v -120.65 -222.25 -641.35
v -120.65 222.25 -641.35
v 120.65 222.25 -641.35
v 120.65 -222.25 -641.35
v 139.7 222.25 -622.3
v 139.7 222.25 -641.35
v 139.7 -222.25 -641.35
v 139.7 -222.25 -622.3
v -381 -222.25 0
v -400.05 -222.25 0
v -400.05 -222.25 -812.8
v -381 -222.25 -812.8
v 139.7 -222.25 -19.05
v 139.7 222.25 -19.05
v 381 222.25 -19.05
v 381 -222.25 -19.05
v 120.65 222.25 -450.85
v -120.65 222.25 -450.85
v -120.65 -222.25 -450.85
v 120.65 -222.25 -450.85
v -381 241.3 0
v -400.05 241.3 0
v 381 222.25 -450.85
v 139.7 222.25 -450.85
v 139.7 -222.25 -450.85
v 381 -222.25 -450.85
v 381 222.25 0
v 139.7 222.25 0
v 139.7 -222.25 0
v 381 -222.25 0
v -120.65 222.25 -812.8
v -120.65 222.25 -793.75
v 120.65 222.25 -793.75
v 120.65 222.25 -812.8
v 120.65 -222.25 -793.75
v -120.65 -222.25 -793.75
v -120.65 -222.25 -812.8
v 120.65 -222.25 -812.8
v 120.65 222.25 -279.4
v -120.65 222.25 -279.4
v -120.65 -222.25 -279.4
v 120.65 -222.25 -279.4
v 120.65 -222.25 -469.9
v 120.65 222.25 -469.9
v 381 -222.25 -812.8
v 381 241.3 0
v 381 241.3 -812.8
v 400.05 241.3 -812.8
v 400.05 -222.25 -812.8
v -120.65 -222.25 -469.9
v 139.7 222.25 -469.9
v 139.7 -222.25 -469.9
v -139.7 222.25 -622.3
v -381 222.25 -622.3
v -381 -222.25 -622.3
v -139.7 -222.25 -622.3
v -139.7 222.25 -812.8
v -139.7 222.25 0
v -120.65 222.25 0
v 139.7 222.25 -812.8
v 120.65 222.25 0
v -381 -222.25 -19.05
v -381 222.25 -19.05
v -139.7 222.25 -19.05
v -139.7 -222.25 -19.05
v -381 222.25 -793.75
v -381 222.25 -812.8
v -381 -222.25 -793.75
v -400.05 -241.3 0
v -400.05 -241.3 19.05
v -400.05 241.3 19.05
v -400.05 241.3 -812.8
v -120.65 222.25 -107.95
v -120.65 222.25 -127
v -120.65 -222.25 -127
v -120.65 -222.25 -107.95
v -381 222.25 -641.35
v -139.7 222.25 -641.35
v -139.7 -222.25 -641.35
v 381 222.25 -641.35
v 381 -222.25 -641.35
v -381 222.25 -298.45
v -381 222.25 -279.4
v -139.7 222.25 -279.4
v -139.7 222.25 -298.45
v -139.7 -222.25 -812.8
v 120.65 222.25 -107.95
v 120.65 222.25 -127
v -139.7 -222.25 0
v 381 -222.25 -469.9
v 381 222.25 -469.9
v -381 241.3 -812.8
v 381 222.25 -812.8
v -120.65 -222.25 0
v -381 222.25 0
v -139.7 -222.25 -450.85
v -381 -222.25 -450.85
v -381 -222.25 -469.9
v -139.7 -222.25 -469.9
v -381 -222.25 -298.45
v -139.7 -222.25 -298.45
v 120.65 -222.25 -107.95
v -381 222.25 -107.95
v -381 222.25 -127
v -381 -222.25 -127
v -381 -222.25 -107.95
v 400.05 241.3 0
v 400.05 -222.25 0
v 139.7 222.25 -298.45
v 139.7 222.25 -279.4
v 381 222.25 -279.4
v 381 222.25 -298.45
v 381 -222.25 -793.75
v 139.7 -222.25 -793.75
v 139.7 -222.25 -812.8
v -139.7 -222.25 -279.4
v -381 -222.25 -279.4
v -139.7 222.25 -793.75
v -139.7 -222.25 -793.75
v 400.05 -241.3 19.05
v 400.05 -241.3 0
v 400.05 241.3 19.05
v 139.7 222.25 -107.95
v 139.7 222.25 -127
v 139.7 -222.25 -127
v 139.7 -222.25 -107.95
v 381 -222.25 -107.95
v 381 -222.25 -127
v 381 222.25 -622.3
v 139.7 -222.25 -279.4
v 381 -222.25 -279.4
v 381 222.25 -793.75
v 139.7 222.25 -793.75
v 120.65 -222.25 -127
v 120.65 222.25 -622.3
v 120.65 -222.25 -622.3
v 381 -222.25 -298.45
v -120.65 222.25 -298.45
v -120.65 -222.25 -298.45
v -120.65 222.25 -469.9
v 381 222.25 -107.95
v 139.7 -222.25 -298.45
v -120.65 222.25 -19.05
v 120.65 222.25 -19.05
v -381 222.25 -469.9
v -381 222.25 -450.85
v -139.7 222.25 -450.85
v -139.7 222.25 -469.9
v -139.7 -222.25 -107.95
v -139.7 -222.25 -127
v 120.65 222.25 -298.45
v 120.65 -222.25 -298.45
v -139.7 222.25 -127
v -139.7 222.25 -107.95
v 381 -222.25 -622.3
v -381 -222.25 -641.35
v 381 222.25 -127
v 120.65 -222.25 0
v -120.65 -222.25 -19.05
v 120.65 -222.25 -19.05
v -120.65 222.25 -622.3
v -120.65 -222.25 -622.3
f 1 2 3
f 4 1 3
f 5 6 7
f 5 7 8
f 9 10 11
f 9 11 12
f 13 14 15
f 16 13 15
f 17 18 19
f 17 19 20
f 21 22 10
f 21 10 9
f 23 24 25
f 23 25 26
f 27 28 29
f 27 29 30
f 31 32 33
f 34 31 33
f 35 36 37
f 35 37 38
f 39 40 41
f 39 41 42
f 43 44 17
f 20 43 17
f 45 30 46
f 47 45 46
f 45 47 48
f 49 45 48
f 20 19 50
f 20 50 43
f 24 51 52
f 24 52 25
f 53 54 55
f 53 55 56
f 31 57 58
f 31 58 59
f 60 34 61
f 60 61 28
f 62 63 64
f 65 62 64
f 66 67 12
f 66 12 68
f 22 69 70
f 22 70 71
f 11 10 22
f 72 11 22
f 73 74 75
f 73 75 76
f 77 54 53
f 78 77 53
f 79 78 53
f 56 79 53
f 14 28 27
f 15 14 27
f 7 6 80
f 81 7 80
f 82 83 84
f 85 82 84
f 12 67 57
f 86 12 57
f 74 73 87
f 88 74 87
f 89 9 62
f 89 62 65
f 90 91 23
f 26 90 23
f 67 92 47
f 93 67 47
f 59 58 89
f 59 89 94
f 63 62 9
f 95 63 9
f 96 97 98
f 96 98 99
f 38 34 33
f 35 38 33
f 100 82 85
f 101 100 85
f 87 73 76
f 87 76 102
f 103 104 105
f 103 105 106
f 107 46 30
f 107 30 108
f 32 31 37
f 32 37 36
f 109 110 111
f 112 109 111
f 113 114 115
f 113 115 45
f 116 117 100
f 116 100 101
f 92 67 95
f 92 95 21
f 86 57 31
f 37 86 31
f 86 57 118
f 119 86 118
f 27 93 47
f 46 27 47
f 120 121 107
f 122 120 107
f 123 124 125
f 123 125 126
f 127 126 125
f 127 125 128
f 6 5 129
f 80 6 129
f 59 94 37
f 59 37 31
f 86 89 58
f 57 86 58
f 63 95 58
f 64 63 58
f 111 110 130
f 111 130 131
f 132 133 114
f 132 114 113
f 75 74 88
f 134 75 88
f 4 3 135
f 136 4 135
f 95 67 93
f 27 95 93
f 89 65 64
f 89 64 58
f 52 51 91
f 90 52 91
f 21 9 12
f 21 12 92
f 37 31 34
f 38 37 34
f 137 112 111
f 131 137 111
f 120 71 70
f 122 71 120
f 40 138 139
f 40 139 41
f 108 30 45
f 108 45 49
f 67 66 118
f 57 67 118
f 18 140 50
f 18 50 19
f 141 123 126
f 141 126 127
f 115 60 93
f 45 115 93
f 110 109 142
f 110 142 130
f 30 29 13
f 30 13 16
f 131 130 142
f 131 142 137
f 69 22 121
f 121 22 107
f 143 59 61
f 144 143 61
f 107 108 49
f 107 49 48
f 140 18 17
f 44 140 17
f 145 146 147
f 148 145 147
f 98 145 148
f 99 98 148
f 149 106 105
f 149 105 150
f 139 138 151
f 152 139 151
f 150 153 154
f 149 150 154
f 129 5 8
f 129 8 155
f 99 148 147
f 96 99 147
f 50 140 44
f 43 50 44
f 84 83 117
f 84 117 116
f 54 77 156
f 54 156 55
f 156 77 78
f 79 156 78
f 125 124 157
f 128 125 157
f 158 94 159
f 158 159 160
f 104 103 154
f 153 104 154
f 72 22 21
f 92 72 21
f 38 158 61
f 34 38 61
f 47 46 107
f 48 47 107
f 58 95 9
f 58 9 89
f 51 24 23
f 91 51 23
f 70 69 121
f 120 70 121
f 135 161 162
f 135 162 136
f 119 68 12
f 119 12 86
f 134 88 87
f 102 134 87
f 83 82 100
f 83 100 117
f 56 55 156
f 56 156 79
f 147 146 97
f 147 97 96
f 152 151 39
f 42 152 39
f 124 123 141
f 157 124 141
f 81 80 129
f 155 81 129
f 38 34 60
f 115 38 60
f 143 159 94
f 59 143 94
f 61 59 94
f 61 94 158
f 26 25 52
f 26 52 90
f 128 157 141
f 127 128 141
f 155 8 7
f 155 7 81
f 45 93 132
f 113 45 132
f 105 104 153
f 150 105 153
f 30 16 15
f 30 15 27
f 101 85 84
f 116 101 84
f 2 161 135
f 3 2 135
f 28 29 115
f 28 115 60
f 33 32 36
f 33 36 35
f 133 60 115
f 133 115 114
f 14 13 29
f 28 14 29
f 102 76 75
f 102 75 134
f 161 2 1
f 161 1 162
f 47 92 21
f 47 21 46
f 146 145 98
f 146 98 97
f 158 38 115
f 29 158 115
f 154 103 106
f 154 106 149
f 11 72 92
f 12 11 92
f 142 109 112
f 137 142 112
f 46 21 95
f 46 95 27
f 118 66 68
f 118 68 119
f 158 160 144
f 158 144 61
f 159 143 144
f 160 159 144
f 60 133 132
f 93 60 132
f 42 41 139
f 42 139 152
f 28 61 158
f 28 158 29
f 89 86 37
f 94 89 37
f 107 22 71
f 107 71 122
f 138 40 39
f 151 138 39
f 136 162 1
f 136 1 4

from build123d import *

# Parameters (mm, degrees)
F1_W      = 800.1
F1_H      = 482.6
F2_DEPTH  = 19.05
F3_W      = 19.05
F3_H      = 463.55
F4_DEPTH  = 812.8
F5_W      = 762
F5_H      = 19.05
F6_DEPTH  = 812.8
F7_W      = 19.05
F7_H      = 444.5
F8_DEPTH  = 812.8
F9_W      = 241.3
F9_H      = 19.05
F10_DEPTH = 444.5


# Not quite as in the source:
# - a variable given as a bare number and used for a length is read in inches; the dataset says mm whatever the document's units were


with BuildPart() as f2:
    # F1 (on Top) → F2 (new body)
    with BuildSketch(Plane.XY):
        Rectangle(F1_W, F1_H)
    extrude(amount=F2_DEPTH)


with BuildPart() as f4:
    # F3 (on face) → F4 (new body)
    with BuildSketch(Plane.XY):
        with Locations((-390.525, 9.525)):
            Rectangle(F3_W, F3_H)
    extrude(amount=-F4_DEPTH)


with BuildPart() as f4b:
    # F3 (on face) → F4, piece 2 (new body)
    with BuildSketch(Plane.XY):
        with Locations((390.525, 9.525)):
            Rectangle(F3_W, F3_H)
    extrude(amount=-F4_DEPTH)


with BuildPart() as f6:
    # F5 (on face) → F6 (new body)
    with BuildSketch(Plane.XY):
        with Locations((0, 231.775)):
            Rectangle(F5_W, F5_H)
    extrude(amount=-F6_DEPTH)


with BuildPart() as f8:
    # F7 (on face) → F8 (new body)
    with BuildSketch(Plane.XY):
        with Locations((-130.175, 0)):
            Rectangle(F7_W, F7_H)
    extrude(amount=-F8_DEPTH)


with BuildPart() as f8b:
    # F7 (on face) → F8, piece 2 (new body)
    with BuildSketch(Plane.XY):
        with Locations((130.175, 0)):
            Rectangle(F7_W, F7_H)
    extrude(amount=-F8_DEPTH)


with BuildPart() as f10:
    # F9 (on face) → F10 (new body, through all)
    with BuildSketch(Plane.XZ.offset(-222.25)):
        with Locations((-260.35, -9.525)):
            Rectangle(F9_W, F9_H)
    extrude(amount=F10_DEPTH)


with BuildPart() as f10b:
    # F9 (on face) → F10, piece 2 (new body, through all)
    with BuildSketch(Plane.XZ.offset(-222.25)):
        with Locations((260.35, -9.525)):
            Rectangle(F9_W, F9_H)
    extrude(amount=F10_DEPTH)


with BuildPart() as f10c:
    # F9 (on face) → F10, piece 3 (new body, through all)
    with BuildSketch(Plane.XZ.offset(-222.25)):
        with Locations((0, -9.525)):
            Rectangle(F9_W, F9_H)
    extrude(amount=F10_DEPTH)


with BuildPart() as f10d:
    # F9 (on face) → F10, piece 4 (new body, through all)
    with BuildSketch(Plane.XZ.offset(-222.25)):
        with Locations((-260.35, -803.275)):
            Rectangle(F9_W, F9_H)
    extrude(amount=F10_DEPTH)


with BuildPart() as f10e:
    # F9 (on face) → F10, piece 5 (new body, through all)
    with BuildSketch(Plane.XZ.offset(-222.25)):
        with Locations((260.35, -803.275)):
            Rectangle(F9_W, F9_H)
    extrude(amount=F10_DEPTH)


with BuildPart() as f10f:
    # F9 (on face) → F10, piece 6 (new body, through all)
    with BuildSketch(Plane.XZ.offset(-222.25)):
        with Locations((0, -803.275)):
            Rectangle(F9_W, F9_H)
    extrude(amount=F10_DEPTH)


with BuildPart() as f10g:
    # F9 (on face) → F10, piece 7 (new body, through all)
    with BuildSketch(Plane.XZ.offset(-222.25)):
        with Locations((260.35, -631.825)):
            Rectangle(F9_W, F9_H)
    extrude(amount=F10_DEPTH)


with BuildPart() as f10h:
    # F9 (on face) → F10, piece 8 (new body, through all)
    with BuildSketch(Plane.XZ.offset(-222.25)):
        with Locations((-260.35, -631.825)):
            Rectangle(F9_W, F9_H)
    extrude(amount=F10_DEPTH)


with BuildPart() as f10i:
    # F9 (on face) → F10, piece 9 (new body, through all)
    with BuildSketch(Plane.XZ.offset(-222.25)):
        with Locations((0, -631.825)):
            Rectangle(F9_W, F9_H)
    extrude(amount=F10_DEPTH)


with BuildPart() as f10j:
    # F9 (on face) → F10, piece 10 (new body, through all)
    with BuildSketch(Plane.XZ.offset(-222.25)):
        with Locations((260.35, -460.375)):
            Rectangle(F9_W, F9_H)
    extrude(amount=F10_DEPTH)


with BuildPart() as f10k:
    # F9 (on face) → F10, piece 11 (new body, through all)
    with BuildSketch(Plane.XZ.offset(-222.25)):
        with Locations((-260.35, -460.375)):
            Rectangle(F9_W, F9_H)
    extrude(amount=F10_DEPTH)


with BuildPart() as f10l:
    # F9 (on face) → F10, piece 12 (new body, through all)
    with BuildSketch(Plane.XZ.offset(-222.25)):
        with Locations((0, -460.375)):
            Rectangle(F9_W, F9_H)
    extrude(amount=F10_DEPTH)


with BuildPart() as f10m:
    # F9 (on face) → F10, piece 13 (new body, through all)
    with BuildSketch(Plane.XZ.offset(-222.25)):
        with Locations((260.35, -288.925)):
            Rectangle(F9_W, F9_H)
    extrude(amount=F10_DEPTH)


with BuildPart() as f10n:
    # F9 (on face) → F10, piece 14 (new body, through all)
    with BuildSketch(Plane.XZ.offset(-222.25)):
        with Locations((-260.35, -288.925)):
            Rectangle(F9_W, F9_H)
    extrude(amount=F10_DEPTH)


with BuildPart() as f10o:
    # F9 (on face) → F10, piece 15 (new body, through all)
    with BuildSketch(Plane.XZ.offset(-222.25)):
        with Locations((0, -288.925)):
            Rectangle(F9_W, F9_H)
    extrude(amount=F10_DEPTH)


with BuildPart() as f10p:
    # F9 (on face) → F10, piece 16 (new body, through all)
    with BuildSketch(Plane.XZ.offset(-222.25)):
        with Locations((260.35, -117.475)):
            Rectangle(F9_W, F9_H)
    extrude(amount=F10_DEPTH)


with BuildPart() as f10q:
    # F9 (on face) → F10, piece 17 (new body, through all)
    with BuildSketch(Plane.XZ.offset(-222.25)):
        with Locations((-260.35, -117.475)):
            Rectangle(F9_W, F9_H)
    extrude(amount=F10_DEPTH)


with BuildPart() as f10r:
    # F9 (on face) → F10, piece 18 (new body, through all)
    with BuildSketch(Plane.XZ.offset(-222.25)):
        with Locations((0, -117.475)):
            Rectangle(F9_W, F9_H)
    extrude(amount=F10_DEPTH)


solid = Compound([f2.part, f4.part, f4b.part, f6.part, f8.part, f8b.part, f10.part, f10b.part, f10c.part, f10d.part, f10e.part, f10f.part, f10g.part, f10h.part, f10i.part, f10j.part, f10k.part, f10l.part, f10m.part, f10n.part, f10o.part, f10p.part, f10q.part, f10r.part])
